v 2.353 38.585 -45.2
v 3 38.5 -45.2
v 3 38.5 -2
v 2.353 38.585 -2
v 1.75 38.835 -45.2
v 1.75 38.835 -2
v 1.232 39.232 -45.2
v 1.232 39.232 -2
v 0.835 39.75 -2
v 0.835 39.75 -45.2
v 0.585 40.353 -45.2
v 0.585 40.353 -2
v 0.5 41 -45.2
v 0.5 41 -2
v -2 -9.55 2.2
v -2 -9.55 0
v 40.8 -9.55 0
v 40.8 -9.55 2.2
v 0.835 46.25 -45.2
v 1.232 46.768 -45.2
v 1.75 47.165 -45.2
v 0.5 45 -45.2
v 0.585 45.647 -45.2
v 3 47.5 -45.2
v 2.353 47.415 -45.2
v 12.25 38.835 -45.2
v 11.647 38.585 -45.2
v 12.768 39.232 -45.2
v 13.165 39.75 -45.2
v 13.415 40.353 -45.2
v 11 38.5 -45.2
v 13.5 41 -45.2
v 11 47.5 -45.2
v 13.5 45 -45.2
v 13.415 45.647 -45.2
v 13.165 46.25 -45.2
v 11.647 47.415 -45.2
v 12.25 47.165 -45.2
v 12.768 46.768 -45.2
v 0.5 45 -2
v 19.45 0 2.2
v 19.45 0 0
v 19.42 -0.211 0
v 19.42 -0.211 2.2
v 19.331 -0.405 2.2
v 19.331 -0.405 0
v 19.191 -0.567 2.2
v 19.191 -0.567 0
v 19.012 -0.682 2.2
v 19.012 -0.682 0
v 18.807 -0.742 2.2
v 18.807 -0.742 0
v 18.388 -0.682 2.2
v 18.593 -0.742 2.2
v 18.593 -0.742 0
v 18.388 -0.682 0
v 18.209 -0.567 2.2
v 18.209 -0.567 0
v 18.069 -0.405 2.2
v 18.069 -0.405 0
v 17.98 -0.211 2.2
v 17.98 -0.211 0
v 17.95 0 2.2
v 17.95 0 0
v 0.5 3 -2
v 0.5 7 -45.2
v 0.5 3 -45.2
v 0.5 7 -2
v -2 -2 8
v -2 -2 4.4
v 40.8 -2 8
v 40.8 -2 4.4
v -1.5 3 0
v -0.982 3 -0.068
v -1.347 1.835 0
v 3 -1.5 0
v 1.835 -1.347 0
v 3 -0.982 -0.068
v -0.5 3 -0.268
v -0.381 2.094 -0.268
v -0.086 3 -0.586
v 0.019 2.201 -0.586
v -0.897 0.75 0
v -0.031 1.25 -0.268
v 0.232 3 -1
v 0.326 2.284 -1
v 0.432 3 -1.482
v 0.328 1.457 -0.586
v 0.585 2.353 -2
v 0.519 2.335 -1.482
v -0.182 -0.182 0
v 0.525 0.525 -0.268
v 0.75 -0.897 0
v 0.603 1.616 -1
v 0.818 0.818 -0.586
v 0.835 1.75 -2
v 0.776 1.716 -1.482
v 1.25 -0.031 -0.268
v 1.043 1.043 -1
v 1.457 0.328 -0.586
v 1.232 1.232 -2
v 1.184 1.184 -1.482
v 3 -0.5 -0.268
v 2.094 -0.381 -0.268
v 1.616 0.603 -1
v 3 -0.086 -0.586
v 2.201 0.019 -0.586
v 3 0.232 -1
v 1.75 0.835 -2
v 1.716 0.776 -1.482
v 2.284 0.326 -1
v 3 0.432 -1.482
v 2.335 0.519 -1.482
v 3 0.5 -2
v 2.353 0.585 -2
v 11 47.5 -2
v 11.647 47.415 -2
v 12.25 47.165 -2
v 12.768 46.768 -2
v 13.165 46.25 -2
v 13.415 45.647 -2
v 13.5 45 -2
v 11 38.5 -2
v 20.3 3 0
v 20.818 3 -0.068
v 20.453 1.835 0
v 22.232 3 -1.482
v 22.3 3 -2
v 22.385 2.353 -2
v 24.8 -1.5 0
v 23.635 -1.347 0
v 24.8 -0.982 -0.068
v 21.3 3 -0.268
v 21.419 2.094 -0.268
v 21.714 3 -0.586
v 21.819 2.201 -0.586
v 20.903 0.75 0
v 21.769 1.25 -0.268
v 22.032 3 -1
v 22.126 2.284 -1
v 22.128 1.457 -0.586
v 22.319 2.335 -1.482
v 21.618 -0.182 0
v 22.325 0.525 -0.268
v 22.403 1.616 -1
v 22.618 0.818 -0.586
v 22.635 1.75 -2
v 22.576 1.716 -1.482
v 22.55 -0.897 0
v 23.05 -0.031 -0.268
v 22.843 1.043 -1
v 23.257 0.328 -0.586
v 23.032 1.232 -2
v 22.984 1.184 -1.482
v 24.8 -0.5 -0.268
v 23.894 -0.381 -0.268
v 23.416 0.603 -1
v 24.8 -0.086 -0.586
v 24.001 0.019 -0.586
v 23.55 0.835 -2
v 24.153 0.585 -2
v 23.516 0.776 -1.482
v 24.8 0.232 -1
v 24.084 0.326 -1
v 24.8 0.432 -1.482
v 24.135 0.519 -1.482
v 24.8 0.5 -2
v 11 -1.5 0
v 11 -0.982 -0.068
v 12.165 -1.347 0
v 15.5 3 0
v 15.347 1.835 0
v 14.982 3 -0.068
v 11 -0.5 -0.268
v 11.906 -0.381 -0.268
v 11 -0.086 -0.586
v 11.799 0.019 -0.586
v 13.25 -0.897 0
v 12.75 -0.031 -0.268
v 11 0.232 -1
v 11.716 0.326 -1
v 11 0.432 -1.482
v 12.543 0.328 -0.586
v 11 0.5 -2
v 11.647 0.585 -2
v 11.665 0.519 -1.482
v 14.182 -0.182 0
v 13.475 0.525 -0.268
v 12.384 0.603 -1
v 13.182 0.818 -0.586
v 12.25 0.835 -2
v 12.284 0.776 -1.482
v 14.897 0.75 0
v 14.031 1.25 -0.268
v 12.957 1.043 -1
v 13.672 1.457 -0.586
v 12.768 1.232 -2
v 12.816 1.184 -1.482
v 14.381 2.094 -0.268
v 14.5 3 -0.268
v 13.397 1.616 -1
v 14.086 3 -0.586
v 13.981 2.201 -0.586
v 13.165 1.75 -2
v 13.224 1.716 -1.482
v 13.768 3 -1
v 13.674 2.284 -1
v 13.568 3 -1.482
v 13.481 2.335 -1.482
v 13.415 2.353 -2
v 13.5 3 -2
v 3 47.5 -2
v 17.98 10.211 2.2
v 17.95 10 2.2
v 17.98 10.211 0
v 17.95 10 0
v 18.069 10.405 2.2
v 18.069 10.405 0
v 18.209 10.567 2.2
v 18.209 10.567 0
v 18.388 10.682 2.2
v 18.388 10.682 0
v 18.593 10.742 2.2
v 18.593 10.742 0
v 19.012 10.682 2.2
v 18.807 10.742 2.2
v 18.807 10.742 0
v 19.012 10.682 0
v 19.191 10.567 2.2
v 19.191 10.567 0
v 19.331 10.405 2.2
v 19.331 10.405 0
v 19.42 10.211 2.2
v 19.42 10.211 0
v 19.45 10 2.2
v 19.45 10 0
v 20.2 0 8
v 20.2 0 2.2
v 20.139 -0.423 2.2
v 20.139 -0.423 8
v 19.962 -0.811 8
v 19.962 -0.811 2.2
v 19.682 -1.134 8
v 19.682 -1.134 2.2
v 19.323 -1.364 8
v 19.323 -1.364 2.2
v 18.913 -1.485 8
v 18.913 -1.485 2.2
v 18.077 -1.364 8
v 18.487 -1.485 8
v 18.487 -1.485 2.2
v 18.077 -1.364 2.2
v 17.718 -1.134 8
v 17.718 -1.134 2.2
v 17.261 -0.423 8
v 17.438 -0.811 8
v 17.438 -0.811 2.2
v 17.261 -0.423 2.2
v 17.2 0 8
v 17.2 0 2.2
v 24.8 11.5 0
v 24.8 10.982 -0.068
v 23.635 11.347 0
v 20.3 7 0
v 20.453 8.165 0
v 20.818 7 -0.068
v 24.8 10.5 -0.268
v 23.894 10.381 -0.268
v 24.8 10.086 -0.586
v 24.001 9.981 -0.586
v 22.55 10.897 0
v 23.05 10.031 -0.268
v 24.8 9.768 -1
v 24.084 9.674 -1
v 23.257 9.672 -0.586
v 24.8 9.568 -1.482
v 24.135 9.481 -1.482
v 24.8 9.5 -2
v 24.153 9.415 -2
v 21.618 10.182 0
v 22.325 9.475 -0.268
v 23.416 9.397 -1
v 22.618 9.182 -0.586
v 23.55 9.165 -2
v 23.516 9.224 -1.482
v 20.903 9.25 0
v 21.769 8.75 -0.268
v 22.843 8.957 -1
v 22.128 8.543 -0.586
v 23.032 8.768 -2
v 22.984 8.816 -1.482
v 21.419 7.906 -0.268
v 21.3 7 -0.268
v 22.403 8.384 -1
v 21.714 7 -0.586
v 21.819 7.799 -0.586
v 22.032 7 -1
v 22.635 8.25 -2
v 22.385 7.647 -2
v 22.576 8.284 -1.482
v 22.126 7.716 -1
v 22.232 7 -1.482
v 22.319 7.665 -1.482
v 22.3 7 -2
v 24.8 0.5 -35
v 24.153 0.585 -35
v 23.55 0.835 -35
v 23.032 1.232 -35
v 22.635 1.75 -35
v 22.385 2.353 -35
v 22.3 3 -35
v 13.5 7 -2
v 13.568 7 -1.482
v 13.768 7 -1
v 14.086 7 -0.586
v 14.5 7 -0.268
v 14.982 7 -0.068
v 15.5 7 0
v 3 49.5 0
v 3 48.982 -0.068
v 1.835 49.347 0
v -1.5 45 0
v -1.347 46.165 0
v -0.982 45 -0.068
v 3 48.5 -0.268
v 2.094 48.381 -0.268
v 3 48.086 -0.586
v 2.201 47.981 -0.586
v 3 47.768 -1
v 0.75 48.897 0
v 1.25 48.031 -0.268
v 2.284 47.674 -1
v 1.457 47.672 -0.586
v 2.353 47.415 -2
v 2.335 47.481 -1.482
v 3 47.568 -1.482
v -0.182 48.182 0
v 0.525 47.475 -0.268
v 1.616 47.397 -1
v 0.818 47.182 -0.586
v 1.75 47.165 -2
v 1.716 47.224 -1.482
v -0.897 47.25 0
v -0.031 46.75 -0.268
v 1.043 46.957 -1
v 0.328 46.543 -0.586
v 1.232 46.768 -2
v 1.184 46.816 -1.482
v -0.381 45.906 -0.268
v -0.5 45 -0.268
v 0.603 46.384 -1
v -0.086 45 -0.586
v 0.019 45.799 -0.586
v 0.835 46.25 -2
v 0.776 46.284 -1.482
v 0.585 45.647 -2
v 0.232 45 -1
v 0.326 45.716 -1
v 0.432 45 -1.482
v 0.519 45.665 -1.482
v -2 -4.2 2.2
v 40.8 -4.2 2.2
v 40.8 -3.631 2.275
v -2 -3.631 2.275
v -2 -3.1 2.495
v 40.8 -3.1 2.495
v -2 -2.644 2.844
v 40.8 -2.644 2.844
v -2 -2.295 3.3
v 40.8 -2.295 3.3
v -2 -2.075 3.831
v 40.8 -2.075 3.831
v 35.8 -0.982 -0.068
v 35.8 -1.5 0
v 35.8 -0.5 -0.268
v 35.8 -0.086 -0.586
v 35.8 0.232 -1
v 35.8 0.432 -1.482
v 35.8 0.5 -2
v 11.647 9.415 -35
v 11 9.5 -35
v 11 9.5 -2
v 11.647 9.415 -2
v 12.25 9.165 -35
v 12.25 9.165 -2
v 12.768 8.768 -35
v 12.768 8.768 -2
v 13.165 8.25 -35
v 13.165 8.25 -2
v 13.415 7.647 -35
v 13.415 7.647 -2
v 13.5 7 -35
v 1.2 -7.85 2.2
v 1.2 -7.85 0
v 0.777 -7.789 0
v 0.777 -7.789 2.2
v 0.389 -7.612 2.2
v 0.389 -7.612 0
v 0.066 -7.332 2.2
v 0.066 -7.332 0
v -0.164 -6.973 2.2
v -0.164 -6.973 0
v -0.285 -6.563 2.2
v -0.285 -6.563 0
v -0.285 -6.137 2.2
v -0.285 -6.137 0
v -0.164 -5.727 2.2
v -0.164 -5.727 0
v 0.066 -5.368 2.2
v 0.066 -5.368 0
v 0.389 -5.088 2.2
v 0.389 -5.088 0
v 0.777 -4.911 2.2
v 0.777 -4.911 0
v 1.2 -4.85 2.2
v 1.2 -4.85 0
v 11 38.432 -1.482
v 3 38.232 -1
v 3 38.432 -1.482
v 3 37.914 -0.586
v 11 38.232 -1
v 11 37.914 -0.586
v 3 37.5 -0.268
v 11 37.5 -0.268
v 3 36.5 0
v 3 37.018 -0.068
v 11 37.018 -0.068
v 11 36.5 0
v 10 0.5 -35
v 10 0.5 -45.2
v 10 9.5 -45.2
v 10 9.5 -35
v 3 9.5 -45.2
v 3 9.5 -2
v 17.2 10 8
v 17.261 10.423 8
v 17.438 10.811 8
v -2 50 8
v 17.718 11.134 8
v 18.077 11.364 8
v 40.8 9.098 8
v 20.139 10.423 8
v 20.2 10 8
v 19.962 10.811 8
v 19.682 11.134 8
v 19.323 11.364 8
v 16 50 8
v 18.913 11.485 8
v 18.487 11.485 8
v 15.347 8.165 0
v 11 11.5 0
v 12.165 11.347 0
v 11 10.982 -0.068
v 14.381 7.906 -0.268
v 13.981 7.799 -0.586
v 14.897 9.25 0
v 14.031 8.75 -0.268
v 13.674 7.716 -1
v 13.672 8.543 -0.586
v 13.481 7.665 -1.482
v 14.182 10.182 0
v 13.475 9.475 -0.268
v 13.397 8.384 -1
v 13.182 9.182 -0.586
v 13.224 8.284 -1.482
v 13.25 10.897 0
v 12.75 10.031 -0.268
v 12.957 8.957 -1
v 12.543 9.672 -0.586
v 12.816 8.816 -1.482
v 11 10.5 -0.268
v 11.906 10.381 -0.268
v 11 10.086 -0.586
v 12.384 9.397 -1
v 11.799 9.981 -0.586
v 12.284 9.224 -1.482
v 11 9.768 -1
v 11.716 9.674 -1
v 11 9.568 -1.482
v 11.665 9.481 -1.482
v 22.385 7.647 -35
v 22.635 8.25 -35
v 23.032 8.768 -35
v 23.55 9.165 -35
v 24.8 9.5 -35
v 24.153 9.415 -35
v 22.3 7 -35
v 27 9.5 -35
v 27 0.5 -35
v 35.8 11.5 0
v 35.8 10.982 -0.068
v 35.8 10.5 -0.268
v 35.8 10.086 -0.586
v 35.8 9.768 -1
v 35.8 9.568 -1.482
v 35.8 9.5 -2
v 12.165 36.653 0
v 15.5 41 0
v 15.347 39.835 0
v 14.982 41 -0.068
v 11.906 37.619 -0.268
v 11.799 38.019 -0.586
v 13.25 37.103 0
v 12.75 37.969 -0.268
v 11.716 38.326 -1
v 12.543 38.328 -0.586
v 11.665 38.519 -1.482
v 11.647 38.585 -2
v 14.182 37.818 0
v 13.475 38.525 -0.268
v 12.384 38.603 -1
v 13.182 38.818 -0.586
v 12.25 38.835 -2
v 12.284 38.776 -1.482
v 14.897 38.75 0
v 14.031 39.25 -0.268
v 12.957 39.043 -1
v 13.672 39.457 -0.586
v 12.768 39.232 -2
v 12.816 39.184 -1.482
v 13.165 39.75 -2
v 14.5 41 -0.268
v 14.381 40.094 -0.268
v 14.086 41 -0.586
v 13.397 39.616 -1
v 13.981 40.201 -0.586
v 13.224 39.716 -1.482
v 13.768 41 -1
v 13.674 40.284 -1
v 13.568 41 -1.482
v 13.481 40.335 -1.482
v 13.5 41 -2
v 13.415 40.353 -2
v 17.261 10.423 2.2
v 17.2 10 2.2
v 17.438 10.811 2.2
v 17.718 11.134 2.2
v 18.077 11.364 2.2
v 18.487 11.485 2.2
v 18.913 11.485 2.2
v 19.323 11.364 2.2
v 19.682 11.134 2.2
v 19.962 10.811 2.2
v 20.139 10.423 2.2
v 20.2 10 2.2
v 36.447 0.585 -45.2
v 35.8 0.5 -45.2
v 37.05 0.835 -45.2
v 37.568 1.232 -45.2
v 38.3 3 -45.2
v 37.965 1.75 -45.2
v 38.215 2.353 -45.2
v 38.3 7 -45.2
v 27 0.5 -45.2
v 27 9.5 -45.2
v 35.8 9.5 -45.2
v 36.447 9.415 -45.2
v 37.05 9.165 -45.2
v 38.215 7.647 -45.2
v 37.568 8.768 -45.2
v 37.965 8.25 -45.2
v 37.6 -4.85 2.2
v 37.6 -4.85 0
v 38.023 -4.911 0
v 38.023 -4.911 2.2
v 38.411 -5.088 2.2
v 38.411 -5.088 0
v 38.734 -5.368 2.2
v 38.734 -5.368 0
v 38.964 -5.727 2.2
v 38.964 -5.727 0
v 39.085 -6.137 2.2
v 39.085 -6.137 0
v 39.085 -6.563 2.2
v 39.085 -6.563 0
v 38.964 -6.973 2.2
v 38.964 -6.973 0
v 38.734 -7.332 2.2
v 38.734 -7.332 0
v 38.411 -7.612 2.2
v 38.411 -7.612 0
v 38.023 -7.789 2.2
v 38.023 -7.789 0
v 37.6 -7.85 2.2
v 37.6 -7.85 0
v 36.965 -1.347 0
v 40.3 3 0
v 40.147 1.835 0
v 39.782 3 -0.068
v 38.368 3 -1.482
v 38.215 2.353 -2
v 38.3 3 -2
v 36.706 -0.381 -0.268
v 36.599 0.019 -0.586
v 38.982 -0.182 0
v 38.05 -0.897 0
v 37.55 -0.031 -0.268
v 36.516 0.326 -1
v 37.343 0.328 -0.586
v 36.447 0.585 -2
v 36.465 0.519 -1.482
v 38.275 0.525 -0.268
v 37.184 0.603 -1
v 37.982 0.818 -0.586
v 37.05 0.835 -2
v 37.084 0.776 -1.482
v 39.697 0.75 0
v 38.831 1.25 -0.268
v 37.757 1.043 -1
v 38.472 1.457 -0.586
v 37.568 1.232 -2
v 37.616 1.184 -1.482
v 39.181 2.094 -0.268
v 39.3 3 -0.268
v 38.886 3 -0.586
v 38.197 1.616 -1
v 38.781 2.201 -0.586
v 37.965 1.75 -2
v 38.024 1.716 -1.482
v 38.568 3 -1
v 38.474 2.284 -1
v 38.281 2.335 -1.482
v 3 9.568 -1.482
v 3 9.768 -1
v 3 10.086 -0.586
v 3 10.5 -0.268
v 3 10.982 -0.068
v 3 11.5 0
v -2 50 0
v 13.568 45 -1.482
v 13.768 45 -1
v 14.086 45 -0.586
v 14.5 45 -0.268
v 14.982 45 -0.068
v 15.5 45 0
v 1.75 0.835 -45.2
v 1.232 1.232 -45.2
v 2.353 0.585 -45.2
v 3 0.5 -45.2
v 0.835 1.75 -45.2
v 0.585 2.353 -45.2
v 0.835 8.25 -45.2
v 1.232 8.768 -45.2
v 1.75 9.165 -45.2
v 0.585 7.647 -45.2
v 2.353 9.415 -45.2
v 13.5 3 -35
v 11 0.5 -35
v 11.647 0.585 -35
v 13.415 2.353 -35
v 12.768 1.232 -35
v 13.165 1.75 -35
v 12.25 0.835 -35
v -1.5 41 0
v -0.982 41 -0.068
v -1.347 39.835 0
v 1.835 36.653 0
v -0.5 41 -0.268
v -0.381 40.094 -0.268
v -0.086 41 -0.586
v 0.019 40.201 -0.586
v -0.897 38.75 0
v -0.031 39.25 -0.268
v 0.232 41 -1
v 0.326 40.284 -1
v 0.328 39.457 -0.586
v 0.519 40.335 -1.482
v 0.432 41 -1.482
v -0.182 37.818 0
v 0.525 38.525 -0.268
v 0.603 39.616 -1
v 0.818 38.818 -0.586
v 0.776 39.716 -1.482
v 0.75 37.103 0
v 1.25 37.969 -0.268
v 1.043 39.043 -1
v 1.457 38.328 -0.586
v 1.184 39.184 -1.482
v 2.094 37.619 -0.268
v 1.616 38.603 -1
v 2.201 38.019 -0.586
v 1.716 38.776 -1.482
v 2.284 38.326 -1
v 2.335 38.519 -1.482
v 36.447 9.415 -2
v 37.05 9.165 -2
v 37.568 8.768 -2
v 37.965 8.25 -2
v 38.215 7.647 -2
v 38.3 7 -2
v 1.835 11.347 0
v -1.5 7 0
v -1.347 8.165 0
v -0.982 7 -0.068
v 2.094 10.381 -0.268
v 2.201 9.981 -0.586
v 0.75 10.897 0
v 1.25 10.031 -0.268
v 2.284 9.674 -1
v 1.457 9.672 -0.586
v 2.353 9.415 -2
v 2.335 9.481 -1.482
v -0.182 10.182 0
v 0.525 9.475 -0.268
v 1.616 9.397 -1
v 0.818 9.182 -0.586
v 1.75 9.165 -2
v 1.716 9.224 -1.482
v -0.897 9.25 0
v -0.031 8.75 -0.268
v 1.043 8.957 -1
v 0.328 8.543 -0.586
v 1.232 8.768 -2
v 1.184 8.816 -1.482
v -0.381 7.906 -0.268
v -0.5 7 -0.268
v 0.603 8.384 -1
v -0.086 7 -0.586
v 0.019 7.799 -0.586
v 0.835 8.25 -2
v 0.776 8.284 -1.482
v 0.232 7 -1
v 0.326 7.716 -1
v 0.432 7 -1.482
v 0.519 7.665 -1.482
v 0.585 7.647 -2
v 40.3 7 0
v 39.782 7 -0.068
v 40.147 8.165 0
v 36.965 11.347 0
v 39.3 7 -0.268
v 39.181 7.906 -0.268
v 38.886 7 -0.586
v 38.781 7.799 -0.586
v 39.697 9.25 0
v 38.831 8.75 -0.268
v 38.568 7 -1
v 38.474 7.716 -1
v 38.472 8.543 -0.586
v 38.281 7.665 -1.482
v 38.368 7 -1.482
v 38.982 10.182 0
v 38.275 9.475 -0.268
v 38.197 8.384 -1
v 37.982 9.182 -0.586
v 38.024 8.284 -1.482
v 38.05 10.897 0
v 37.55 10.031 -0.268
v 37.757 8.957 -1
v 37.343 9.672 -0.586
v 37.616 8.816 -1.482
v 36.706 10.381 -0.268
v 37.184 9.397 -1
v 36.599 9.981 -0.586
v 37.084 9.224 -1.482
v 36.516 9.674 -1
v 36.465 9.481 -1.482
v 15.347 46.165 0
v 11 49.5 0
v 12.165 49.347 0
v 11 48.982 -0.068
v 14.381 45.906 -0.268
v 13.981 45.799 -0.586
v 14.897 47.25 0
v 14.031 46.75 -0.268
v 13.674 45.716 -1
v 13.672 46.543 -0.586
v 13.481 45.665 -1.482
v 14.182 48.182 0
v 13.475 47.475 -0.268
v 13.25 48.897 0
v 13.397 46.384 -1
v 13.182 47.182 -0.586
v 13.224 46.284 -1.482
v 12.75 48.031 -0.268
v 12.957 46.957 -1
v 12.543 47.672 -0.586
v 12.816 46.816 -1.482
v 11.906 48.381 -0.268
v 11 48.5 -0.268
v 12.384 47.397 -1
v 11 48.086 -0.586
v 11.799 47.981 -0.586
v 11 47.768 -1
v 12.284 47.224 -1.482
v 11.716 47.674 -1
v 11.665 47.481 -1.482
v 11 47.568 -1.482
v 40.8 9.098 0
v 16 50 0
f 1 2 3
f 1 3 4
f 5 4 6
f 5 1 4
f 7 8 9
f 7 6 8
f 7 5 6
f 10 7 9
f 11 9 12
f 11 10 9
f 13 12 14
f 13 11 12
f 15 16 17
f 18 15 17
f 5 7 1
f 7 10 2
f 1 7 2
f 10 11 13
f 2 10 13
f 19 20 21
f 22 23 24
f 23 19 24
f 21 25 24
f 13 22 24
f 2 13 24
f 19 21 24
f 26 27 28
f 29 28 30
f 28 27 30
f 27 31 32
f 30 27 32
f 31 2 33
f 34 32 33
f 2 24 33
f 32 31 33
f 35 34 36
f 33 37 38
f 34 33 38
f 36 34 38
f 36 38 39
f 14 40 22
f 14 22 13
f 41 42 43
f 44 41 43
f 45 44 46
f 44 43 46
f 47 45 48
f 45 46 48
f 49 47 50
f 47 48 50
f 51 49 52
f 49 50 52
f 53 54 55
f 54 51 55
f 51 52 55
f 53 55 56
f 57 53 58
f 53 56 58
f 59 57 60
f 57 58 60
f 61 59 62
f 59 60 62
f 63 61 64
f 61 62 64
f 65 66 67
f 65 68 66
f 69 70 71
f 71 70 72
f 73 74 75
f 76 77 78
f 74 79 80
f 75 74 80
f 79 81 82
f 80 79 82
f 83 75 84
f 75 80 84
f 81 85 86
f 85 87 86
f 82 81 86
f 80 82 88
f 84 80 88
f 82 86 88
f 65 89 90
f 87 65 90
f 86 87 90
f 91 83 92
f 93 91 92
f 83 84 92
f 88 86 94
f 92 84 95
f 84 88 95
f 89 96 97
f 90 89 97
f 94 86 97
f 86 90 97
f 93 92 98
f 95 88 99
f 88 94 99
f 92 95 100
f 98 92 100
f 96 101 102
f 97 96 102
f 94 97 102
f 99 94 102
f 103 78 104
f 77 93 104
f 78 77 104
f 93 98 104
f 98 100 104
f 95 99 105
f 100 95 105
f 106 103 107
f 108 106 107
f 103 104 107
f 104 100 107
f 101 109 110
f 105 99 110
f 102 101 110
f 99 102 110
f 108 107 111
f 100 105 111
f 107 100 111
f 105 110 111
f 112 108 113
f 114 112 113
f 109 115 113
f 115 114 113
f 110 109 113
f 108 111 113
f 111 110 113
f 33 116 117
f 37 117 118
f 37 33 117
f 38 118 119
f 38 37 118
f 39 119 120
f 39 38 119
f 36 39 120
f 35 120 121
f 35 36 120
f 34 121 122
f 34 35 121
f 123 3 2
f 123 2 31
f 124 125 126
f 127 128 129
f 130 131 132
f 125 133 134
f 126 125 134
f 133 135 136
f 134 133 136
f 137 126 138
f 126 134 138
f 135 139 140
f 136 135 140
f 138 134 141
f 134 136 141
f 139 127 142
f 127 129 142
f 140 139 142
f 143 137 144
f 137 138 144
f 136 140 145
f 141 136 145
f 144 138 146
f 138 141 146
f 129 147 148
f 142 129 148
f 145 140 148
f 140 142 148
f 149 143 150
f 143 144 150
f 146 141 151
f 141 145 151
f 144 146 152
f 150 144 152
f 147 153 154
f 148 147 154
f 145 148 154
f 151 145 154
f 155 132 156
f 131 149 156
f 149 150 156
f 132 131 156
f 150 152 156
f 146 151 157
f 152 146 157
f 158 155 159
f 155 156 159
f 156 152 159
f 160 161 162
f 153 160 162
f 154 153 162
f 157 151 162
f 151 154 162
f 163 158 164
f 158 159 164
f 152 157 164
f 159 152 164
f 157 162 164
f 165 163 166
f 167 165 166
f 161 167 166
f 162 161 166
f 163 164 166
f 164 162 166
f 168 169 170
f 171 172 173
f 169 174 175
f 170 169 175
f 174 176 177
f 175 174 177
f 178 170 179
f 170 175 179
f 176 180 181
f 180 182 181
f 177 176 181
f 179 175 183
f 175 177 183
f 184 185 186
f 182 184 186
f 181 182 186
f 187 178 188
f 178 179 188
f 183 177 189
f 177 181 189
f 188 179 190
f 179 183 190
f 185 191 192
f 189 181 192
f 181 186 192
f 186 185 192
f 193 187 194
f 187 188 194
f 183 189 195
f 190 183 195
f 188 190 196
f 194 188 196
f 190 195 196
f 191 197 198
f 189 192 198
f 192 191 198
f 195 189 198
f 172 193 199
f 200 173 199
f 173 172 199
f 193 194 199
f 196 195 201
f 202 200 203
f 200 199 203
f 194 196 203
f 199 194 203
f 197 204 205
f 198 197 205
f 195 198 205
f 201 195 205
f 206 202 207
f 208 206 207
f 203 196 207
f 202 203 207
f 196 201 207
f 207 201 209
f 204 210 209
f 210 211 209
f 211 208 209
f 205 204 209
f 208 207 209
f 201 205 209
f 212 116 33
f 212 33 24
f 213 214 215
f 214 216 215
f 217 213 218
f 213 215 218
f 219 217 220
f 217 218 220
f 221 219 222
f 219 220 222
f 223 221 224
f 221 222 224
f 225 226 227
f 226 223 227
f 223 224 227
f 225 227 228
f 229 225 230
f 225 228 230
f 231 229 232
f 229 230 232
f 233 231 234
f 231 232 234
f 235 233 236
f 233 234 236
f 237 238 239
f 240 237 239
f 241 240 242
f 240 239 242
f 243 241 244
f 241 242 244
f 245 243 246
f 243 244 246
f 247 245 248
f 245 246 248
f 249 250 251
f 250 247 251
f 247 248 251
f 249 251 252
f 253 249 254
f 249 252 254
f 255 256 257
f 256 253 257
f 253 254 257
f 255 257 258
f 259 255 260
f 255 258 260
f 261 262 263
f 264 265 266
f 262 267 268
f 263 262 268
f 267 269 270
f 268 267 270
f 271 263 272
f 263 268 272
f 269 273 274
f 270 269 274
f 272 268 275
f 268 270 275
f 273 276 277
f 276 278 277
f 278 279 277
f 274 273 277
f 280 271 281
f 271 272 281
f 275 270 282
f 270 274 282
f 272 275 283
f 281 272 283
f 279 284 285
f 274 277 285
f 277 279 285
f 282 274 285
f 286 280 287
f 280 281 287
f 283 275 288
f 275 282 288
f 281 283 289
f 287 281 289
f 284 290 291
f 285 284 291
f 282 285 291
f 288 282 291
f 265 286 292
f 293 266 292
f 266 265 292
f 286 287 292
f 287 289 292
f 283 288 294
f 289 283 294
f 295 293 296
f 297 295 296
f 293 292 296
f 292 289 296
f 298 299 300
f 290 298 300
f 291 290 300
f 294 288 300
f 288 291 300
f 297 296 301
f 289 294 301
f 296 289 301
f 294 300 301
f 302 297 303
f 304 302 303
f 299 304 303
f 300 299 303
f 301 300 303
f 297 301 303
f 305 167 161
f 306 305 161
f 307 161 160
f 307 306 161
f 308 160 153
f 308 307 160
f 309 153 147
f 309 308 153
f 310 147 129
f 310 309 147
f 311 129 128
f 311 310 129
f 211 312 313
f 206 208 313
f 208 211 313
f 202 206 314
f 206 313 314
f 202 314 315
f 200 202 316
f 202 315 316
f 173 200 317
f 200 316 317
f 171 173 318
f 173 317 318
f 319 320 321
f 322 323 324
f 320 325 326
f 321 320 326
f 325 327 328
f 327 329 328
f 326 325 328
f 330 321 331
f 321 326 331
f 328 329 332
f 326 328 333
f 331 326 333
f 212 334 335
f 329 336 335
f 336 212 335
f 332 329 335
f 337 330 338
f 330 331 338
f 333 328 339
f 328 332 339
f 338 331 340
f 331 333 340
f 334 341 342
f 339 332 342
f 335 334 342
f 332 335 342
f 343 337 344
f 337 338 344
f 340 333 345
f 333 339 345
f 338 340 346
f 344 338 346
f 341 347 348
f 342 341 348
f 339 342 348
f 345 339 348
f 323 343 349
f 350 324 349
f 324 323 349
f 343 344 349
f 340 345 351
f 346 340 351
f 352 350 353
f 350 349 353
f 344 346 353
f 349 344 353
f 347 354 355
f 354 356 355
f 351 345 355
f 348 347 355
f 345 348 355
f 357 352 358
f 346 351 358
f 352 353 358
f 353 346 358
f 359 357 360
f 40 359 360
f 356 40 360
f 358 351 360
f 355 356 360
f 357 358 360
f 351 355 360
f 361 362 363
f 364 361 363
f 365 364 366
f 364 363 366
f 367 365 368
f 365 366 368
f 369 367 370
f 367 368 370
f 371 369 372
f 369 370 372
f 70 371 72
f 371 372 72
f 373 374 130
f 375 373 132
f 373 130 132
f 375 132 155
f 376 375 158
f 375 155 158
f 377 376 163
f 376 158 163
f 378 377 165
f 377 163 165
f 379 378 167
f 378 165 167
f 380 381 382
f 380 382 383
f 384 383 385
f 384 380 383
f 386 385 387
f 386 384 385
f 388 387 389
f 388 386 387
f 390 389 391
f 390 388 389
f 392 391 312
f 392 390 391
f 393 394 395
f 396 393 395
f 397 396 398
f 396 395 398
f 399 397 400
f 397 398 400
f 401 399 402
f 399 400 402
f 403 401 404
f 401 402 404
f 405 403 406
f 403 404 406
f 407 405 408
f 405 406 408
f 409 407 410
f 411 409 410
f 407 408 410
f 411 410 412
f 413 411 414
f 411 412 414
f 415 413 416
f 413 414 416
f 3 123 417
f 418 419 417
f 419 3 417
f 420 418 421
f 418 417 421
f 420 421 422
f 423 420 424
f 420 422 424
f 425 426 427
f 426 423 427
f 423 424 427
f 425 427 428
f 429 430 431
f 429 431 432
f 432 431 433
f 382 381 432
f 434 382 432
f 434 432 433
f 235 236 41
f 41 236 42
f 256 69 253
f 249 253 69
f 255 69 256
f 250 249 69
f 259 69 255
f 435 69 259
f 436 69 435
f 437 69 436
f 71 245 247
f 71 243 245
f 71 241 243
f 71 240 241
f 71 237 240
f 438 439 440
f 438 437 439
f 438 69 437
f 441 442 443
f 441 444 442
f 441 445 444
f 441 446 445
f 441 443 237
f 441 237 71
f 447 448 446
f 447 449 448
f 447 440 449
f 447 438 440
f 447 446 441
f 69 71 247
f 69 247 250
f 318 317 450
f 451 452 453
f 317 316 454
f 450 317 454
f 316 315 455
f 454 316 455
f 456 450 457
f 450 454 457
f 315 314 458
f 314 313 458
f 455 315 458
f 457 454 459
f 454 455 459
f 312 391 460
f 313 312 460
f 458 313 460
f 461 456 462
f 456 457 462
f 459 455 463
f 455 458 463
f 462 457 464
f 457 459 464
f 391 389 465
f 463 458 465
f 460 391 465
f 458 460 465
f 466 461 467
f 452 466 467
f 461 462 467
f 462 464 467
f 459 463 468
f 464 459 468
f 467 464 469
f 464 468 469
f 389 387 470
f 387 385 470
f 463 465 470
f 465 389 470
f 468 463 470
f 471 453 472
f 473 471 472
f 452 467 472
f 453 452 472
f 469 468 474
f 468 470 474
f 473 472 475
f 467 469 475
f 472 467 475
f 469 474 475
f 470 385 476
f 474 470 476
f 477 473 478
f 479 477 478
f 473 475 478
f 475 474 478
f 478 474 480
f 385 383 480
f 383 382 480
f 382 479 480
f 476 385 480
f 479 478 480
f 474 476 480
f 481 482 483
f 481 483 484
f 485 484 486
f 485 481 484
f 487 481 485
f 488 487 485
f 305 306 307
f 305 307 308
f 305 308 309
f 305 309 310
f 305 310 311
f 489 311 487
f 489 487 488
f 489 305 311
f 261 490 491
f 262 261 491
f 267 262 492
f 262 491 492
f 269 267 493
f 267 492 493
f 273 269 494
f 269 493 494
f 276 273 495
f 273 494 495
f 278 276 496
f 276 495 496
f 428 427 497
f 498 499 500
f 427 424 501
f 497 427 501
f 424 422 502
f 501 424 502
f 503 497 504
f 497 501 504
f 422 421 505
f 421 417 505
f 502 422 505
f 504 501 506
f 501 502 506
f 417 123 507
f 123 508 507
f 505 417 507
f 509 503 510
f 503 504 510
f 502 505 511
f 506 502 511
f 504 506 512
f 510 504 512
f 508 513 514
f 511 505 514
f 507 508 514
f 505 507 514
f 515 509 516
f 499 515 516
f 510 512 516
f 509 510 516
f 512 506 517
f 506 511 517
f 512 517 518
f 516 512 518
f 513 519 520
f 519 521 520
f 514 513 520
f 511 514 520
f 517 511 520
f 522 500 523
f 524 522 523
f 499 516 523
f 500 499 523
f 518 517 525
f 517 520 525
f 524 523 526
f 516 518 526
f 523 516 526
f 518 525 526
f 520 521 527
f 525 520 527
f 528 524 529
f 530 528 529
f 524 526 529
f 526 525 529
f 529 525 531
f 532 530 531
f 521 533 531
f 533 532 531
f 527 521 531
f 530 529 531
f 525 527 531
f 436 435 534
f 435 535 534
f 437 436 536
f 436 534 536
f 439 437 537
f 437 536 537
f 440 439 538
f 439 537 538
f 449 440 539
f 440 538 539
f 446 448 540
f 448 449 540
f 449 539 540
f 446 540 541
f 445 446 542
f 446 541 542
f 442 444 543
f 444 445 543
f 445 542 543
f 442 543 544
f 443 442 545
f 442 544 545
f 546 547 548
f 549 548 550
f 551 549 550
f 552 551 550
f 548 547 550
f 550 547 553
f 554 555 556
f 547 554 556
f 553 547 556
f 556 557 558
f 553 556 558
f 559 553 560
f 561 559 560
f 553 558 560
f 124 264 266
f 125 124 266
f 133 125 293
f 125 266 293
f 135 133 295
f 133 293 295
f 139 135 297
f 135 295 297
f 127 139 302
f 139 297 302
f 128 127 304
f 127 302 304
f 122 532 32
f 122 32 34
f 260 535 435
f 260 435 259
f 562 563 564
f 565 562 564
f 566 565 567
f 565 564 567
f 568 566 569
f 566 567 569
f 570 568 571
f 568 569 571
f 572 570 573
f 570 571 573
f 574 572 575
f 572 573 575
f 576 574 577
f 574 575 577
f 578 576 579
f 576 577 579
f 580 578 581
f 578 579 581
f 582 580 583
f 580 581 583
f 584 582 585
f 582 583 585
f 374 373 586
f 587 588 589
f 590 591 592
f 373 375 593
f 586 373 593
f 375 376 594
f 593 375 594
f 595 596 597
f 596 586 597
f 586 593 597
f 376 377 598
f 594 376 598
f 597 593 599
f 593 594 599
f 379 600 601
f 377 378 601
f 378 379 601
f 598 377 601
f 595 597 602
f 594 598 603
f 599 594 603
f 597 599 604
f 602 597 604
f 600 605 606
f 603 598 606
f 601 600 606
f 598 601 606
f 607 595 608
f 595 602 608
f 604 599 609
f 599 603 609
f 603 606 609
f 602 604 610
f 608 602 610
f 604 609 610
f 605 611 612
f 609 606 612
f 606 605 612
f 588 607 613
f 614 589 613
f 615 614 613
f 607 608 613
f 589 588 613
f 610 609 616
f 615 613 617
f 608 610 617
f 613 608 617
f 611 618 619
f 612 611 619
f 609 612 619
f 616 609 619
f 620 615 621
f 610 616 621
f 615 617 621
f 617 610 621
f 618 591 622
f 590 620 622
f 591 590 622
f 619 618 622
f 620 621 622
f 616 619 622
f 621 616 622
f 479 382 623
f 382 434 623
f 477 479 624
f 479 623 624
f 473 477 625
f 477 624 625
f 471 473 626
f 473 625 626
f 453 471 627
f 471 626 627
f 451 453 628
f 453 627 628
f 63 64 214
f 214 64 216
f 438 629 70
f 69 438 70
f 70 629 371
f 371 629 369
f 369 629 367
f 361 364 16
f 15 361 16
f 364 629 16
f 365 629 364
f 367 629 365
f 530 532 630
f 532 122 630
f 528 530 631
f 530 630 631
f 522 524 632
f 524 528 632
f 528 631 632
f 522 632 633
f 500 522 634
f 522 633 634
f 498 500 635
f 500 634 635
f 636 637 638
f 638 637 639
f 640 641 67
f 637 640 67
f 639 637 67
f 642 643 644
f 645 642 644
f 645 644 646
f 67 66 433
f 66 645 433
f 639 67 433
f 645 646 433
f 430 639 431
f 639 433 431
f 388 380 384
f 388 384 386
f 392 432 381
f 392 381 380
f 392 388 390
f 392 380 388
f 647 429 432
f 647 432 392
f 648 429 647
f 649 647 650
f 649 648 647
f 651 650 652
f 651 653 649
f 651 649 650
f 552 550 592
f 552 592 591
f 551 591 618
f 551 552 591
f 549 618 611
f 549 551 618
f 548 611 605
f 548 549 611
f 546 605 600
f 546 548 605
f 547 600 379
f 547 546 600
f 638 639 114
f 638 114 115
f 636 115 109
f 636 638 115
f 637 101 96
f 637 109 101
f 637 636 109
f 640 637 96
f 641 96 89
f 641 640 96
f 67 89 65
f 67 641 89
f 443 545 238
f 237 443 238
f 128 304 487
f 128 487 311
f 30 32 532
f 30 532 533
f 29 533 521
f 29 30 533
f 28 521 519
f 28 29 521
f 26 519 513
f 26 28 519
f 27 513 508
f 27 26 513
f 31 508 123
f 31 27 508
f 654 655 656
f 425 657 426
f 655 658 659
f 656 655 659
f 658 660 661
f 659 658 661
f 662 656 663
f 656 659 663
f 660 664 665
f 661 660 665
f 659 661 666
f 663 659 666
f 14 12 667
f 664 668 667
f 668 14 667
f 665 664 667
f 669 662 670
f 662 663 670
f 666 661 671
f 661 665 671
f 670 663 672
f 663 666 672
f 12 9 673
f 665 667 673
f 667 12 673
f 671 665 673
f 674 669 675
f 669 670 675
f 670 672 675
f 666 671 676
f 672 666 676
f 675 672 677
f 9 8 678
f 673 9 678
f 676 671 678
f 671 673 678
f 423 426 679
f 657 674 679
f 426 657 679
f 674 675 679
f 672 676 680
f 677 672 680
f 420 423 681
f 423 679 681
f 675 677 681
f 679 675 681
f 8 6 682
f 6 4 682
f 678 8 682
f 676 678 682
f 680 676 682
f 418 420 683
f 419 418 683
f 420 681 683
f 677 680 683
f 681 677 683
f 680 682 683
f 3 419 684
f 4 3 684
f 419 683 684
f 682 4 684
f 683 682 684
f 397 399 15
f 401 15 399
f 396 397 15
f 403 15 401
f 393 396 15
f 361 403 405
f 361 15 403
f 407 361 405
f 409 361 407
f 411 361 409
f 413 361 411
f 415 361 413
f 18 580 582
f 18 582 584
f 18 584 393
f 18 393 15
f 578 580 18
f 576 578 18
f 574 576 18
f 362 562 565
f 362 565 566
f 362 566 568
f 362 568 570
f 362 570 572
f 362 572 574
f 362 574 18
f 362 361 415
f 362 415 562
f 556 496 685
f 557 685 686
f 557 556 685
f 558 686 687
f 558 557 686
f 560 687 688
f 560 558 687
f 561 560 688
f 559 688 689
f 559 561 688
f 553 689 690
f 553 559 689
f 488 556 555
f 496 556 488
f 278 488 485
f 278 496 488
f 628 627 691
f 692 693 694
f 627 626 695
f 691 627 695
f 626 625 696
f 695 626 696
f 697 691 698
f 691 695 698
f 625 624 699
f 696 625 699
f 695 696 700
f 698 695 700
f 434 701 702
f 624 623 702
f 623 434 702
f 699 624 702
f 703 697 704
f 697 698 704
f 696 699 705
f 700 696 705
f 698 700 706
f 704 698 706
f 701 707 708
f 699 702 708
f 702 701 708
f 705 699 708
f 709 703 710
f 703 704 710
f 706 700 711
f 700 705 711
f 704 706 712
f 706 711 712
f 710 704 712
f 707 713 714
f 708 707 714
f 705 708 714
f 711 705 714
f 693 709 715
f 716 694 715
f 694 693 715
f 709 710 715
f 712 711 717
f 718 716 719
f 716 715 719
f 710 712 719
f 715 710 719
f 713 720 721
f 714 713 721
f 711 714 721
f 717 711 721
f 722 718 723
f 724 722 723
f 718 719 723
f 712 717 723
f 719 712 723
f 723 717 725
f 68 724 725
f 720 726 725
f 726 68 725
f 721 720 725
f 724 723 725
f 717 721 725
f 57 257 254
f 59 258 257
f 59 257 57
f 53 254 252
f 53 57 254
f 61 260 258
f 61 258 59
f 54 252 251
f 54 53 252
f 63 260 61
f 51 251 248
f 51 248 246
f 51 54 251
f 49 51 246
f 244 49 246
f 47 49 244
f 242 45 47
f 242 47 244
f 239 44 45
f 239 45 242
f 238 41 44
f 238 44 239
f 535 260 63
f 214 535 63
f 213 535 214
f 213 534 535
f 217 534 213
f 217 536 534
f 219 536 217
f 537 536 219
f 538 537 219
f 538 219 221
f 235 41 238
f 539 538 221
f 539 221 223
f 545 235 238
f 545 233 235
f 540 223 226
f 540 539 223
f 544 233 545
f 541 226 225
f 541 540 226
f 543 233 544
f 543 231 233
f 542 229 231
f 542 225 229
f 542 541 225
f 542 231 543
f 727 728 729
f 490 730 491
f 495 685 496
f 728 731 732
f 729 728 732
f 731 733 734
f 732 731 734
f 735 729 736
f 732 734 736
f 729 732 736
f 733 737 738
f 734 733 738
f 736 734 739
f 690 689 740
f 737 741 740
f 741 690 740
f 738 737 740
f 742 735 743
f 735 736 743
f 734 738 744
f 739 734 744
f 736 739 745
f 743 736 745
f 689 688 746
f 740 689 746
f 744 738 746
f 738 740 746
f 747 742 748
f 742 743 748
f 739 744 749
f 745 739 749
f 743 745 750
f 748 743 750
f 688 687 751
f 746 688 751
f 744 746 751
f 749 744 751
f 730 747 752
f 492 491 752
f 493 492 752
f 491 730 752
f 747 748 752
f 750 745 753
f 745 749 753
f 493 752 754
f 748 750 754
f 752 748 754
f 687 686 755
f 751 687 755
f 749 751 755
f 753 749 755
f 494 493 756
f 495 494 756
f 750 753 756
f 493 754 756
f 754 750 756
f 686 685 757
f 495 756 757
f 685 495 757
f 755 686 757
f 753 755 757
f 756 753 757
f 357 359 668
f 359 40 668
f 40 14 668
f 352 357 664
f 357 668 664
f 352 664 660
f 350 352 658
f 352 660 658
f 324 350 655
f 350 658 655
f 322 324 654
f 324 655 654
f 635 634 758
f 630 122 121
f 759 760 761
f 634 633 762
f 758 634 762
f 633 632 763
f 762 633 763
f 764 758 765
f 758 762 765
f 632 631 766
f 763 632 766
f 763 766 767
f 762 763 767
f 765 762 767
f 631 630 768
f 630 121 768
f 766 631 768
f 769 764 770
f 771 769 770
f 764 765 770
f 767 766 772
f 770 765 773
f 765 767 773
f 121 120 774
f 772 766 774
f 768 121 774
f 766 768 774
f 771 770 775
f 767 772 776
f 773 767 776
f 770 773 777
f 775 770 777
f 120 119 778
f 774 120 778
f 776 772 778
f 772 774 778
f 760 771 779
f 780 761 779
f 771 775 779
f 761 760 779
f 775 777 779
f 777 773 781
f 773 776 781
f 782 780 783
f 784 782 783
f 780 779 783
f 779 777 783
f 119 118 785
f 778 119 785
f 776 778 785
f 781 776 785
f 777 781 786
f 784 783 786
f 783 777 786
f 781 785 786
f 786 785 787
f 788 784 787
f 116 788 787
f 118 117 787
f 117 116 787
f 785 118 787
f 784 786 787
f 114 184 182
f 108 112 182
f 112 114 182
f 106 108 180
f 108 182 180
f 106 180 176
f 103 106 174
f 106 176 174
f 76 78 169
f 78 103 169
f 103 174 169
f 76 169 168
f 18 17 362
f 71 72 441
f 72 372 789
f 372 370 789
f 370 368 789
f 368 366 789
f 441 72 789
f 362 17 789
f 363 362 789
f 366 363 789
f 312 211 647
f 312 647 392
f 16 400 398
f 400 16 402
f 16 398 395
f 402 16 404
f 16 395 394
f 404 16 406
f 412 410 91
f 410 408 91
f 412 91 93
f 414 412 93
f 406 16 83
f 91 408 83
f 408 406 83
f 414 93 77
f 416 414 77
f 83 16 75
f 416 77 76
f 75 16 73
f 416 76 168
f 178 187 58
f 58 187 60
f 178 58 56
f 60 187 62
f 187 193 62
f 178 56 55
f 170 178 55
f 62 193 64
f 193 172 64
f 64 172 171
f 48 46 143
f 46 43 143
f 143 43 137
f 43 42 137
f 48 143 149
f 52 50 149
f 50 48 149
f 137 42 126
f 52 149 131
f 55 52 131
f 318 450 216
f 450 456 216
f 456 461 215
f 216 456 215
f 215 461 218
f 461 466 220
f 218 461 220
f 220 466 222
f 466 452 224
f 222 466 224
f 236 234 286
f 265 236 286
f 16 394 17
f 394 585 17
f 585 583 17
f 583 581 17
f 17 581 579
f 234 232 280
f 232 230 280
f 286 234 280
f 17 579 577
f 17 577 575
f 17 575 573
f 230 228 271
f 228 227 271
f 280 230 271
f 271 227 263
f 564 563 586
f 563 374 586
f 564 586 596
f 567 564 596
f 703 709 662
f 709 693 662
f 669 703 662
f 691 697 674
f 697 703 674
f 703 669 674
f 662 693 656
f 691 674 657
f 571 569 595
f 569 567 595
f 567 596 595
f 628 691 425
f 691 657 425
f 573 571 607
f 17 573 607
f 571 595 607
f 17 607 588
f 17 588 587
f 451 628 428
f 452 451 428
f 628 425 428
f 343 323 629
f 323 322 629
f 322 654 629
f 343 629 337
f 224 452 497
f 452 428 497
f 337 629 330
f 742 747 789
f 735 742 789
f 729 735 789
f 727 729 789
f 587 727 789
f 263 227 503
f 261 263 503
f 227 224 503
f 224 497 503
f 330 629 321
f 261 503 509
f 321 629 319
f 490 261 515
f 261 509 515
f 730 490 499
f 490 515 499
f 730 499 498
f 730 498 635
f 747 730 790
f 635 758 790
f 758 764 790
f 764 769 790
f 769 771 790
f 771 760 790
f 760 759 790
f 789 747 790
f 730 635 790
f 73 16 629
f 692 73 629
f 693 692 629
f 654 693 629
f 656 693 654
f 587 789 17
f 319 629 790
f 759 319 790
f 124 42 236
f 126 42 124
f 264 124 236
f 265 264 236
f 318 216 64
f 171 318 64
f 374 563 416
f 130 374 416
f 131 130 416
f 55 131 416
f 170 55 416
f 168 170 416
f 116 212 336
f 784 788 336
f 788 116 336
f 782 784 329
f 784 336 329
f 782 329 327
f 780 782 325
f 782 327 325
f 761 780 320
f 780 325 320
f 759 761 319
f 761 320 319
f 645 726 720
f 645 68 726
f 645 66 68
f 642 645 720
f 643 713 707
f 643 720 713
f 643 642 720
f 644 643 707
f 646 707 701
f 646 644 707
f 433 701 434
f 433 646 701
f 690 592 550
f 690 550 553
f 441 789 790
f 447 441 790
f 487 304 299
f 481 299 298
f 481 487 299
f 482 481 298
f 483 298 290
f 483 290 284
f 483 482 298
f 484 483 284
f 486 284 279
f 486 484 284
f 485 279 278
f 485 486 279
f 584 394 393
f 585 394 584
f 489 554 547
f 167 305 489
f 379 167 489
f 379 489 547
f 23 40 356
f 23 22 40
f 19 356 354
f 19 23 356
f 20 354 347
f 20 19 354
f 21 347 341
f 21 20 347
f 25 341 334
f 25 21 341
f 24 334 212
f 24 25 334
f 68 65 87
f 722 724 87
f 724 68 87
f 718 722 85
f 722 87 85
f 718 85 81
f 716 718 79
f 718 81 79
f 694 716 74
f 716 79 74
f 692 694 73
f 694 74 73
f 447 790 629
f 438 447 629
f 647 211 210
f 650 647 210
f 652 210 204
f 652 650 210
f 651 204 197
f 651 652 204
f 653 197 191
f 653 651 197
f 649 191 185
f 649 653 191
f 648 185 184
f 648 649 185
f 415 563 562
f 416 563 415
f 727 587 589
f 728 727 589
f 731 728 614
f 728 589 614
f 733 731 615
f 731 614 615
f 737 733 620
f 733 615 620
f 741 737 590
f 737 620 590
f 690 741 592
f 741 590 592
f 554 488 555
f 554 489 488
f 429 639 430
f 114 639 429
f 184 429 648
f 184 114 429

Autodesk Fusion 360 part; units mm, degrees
sketch "スケッチ1" plane through (0, 0, 0) normal (0, 0, 1) x (1, 0, 0)
  line L0 (0, 0) -> (14, 0)
  line L1 (14, 0) -> (14, 10)
  line L2 (14, 10) -> (0, 10)
  line L3 (0, 10) -> (0, 0)
  line L4 (21.8, 0) -> (38.8, 0)
  line L5 (38.8, 0) -> (38.8, 10)
  line L6 (38.8, 10) -> (21.8, 10)
  line L7 (21.8, 10) -> (21.8, 0)
  line L8 (0.5, 9.5) -> (0.5, 0.5)
  line L9 (0.5, 0.5) -> (13.5, 0.5)
  line L10 (13.5, 0.5) -> (13.5, 9.5)
  line L11 (13.5, 9.5) -> (0.5, 9.5)
  line L12 (22.3, 0.5) -> (38.3, 0.5)
  line L13 (38.3, 0.5) -> (38.3, 9.5)
  line L14 (38.3, 9.5) -> (22.3, 9.5)
  line L15 (22.3, 9.5) -> (22.3, 0.5)
  line L16 (0, 38) -> (14, 38)
  line L17 (14, 38) -> (14, 48)
  line L18 (14, 48) -> (0, 48)
  line L19 (0, 48) -> (0, 38)
  line L20 (0.5, 38.5) -> (13.5, 38.5)
  line L21 (13.5, 38.5) -> (13.5, 47.5)
  line L22 (13.5, 47.5) -> (0.5, 47.5)
  line L23 (0.5, 47.5) -> (0.5, 38.5)
  line L24 (-2, 50) -> (-2, -6.35)
  line L25 (-2, -6.35) -> (40.8, -6.35)
  line L26 (40.8, -6.35) -> (40.8, 9.0983)
  line L27 (40.8, 9.0983) -> (16, 50)
  line L28 (16, 50) -> (-2, 50)
  line L29 (17.95, 10) -> (19.45, 10)
  line L30 (19.45, 10) -> (19.45, 0)
  line L31 (17.95, 0) -> (17.95, 10)
  line L32 (17.2, 10) -> (17.2, 0)
  line L33 (20.2, 10) -> (20.2, 0)
  arc A0 (19.45, 10) -> (17.95, 10) centre (18.7, 10) ccw
  arc A1 (20.2, 10) -> (17.2, 10) centre (18.7, 10) ccw
  arc A2 (17.95, 0) -> (19.45, 0) centre (18.7, 0) ccw
  arc A3 (17.2, 0) -> (20.2, 0) centre (18.7, 0) ccw
  circle A4 centre (1.2, -6.35) radius 1.5
  circle A5 centre (37.6, -6.35) radius 1.5
  line L34 (-2, -6.35) -> (-2, -9.55)
  line L35 (-2, -9.55) -> (40.8, -9.55)
  line L36 (40.8, -9.55) -> (40.8, -6.35)
  line L37 (1.2, -7.85) -> (37.6, -7.85)
  line L38 (37.6, -4.85) -> (1.2, -4.85)
  line L39 (-2, -2) -> (40.8, -2)
  dimension "d1" = 14
  dimension "d2" = 10
  dimension "d3" = 17
  dimension "d4" = 10
  dimension "d5" = 7.8
  dimension "d6" = -0.5
  dimension "d7" = -0.5
  dimension "d8" = 14
  dimension "d9" = 10
  dimension "d10" = 28
  dimension "d11" = -0.5
  dimension "d12" = 2
  dimension "d13" = 2
  dimension "d14" = 2
  dimension "d15" = 14
  dimension "d16" = 6.35
  dimension "d17" = 2
  dimension "d39" = 1.5
  dimension "d40" = 3.95
  dimension "d41" = 0.75
  dimension "d42" = 0.75
  dimension "d45" = 3
  dimension "d46" = 3
  dimension "d47" = 3.2
  dimension "d48" = 3.2
  dimension "d49" = 3.2
  dimension "d50" = 2
extrude "押し出し1" add sketch "スケッチ1" against normal blind 45.2 contours L8 L9 L10 L11 | L12 L13 L14 L15 | L20 L21 L22 L23 makes body 1 at (4.8333, 38.5, -30.1333) makes body 2 at (9.1667, 9.5, -15.0667) makes body 3 at (32.9667, 9.5, -30.1333)
extrude "押し出し2" add sketch "スケッチ1" along normal blind 8 contours L0 L1 L2 L3 | L4 L5 L6 L7 | L8 L9 L10 L11 | L12 L13 L14 L15 | L16 L17 L18 L19 | L20 L21 L22 L23 | L24 L26 L27 L28 L39 bodies 1 2 3
fillet "フィレット1" radius 2.5 12 edges at (38.3, 9.5, -22.6) (38.3, 0.5, -22.6) (13.5, 9.5, -22.6) (13.5, 0.5, -22.6) (13.5, 38.5, -22.6) (13.5, 47.5, -22.6) (22.3, 0.5, -22.6) (22.3, 9.5, -22.6) (0.5, 38.5, -22.6) (0.5, 47.5, -22.6) (0.5, 9.5, -22.6) (0.5, 0.5, -22.6) on bodies 1
fillet "フィレット2" radius 2 24 edges at (1.2322, 8.7678, 0) (7, 9.5, 0) (12.7678, 8.7678, 0) (13.5, 5, 0) (12.7678, 1.2322, 0) (7, 0.5, 0) (1.2322, 1.2322, 0) (0.5, 5, 0) (23.0322, 8.7678, 0) (30.3, 9.5, 0) (37.5678, 8.7678, 0) (38.3, 5, 0) (37.5678, 1.2322, 0) (30.3, 0.5, 0) (23.0322, 1.2322, 0) (22.3, 5, 0) (12.7678, 46.7678, 0) (13.5, 43, 0) (12.7678, 39.2322, 0) (7, 38.5, 0) (1.2322, 39.2322, 0) (0.5, 43, 0) (1.2322, 46.7678, 0) (7, 47.5, 0) on bodies 1
sketch "スケッチ2" plane through (0, 0.5, 0) normal (0, -1, 0) x (1, 0, 0)
  line L0 (11, -2) -> (3, -2)
  line L1 (3, -2) -> (3, -45.2)
  line L2 (3, -45.2) -> (11, -45.2)
  line L3 (11, -45.2) -> (11, -2)
  line L4 (10, -35) -> (27, -35)
  line L5 (27, -35) -> (27, -46)
  line L6 (27, -46) -> (10, -46)
  line L7 (10, -46) -> (10, -35)
  dimension "d26" = 17
  dimension "d27" = 11
  dimension "d28" = 46
  dimension "d29" = 10
extrude "押し出し3" cut sketch "スケッチ2" against normal blind 10 contours L2 L3 L4 L5 L6 L7 | L2 L3 L4 L7 bodies 1
extrude "押し出し5" add sketch "スケッチ1" along normal blind 2.2 contours L24 L25 L26 A4 A5 L38 L39 | L25 A4 A5 L34 L35 L36 L37 | L32 L33 A1 A3 bodies 1
fillet "フィレット3" radius 2.2 1 edges at (19.4, -2, 2.2) on bodies 1
